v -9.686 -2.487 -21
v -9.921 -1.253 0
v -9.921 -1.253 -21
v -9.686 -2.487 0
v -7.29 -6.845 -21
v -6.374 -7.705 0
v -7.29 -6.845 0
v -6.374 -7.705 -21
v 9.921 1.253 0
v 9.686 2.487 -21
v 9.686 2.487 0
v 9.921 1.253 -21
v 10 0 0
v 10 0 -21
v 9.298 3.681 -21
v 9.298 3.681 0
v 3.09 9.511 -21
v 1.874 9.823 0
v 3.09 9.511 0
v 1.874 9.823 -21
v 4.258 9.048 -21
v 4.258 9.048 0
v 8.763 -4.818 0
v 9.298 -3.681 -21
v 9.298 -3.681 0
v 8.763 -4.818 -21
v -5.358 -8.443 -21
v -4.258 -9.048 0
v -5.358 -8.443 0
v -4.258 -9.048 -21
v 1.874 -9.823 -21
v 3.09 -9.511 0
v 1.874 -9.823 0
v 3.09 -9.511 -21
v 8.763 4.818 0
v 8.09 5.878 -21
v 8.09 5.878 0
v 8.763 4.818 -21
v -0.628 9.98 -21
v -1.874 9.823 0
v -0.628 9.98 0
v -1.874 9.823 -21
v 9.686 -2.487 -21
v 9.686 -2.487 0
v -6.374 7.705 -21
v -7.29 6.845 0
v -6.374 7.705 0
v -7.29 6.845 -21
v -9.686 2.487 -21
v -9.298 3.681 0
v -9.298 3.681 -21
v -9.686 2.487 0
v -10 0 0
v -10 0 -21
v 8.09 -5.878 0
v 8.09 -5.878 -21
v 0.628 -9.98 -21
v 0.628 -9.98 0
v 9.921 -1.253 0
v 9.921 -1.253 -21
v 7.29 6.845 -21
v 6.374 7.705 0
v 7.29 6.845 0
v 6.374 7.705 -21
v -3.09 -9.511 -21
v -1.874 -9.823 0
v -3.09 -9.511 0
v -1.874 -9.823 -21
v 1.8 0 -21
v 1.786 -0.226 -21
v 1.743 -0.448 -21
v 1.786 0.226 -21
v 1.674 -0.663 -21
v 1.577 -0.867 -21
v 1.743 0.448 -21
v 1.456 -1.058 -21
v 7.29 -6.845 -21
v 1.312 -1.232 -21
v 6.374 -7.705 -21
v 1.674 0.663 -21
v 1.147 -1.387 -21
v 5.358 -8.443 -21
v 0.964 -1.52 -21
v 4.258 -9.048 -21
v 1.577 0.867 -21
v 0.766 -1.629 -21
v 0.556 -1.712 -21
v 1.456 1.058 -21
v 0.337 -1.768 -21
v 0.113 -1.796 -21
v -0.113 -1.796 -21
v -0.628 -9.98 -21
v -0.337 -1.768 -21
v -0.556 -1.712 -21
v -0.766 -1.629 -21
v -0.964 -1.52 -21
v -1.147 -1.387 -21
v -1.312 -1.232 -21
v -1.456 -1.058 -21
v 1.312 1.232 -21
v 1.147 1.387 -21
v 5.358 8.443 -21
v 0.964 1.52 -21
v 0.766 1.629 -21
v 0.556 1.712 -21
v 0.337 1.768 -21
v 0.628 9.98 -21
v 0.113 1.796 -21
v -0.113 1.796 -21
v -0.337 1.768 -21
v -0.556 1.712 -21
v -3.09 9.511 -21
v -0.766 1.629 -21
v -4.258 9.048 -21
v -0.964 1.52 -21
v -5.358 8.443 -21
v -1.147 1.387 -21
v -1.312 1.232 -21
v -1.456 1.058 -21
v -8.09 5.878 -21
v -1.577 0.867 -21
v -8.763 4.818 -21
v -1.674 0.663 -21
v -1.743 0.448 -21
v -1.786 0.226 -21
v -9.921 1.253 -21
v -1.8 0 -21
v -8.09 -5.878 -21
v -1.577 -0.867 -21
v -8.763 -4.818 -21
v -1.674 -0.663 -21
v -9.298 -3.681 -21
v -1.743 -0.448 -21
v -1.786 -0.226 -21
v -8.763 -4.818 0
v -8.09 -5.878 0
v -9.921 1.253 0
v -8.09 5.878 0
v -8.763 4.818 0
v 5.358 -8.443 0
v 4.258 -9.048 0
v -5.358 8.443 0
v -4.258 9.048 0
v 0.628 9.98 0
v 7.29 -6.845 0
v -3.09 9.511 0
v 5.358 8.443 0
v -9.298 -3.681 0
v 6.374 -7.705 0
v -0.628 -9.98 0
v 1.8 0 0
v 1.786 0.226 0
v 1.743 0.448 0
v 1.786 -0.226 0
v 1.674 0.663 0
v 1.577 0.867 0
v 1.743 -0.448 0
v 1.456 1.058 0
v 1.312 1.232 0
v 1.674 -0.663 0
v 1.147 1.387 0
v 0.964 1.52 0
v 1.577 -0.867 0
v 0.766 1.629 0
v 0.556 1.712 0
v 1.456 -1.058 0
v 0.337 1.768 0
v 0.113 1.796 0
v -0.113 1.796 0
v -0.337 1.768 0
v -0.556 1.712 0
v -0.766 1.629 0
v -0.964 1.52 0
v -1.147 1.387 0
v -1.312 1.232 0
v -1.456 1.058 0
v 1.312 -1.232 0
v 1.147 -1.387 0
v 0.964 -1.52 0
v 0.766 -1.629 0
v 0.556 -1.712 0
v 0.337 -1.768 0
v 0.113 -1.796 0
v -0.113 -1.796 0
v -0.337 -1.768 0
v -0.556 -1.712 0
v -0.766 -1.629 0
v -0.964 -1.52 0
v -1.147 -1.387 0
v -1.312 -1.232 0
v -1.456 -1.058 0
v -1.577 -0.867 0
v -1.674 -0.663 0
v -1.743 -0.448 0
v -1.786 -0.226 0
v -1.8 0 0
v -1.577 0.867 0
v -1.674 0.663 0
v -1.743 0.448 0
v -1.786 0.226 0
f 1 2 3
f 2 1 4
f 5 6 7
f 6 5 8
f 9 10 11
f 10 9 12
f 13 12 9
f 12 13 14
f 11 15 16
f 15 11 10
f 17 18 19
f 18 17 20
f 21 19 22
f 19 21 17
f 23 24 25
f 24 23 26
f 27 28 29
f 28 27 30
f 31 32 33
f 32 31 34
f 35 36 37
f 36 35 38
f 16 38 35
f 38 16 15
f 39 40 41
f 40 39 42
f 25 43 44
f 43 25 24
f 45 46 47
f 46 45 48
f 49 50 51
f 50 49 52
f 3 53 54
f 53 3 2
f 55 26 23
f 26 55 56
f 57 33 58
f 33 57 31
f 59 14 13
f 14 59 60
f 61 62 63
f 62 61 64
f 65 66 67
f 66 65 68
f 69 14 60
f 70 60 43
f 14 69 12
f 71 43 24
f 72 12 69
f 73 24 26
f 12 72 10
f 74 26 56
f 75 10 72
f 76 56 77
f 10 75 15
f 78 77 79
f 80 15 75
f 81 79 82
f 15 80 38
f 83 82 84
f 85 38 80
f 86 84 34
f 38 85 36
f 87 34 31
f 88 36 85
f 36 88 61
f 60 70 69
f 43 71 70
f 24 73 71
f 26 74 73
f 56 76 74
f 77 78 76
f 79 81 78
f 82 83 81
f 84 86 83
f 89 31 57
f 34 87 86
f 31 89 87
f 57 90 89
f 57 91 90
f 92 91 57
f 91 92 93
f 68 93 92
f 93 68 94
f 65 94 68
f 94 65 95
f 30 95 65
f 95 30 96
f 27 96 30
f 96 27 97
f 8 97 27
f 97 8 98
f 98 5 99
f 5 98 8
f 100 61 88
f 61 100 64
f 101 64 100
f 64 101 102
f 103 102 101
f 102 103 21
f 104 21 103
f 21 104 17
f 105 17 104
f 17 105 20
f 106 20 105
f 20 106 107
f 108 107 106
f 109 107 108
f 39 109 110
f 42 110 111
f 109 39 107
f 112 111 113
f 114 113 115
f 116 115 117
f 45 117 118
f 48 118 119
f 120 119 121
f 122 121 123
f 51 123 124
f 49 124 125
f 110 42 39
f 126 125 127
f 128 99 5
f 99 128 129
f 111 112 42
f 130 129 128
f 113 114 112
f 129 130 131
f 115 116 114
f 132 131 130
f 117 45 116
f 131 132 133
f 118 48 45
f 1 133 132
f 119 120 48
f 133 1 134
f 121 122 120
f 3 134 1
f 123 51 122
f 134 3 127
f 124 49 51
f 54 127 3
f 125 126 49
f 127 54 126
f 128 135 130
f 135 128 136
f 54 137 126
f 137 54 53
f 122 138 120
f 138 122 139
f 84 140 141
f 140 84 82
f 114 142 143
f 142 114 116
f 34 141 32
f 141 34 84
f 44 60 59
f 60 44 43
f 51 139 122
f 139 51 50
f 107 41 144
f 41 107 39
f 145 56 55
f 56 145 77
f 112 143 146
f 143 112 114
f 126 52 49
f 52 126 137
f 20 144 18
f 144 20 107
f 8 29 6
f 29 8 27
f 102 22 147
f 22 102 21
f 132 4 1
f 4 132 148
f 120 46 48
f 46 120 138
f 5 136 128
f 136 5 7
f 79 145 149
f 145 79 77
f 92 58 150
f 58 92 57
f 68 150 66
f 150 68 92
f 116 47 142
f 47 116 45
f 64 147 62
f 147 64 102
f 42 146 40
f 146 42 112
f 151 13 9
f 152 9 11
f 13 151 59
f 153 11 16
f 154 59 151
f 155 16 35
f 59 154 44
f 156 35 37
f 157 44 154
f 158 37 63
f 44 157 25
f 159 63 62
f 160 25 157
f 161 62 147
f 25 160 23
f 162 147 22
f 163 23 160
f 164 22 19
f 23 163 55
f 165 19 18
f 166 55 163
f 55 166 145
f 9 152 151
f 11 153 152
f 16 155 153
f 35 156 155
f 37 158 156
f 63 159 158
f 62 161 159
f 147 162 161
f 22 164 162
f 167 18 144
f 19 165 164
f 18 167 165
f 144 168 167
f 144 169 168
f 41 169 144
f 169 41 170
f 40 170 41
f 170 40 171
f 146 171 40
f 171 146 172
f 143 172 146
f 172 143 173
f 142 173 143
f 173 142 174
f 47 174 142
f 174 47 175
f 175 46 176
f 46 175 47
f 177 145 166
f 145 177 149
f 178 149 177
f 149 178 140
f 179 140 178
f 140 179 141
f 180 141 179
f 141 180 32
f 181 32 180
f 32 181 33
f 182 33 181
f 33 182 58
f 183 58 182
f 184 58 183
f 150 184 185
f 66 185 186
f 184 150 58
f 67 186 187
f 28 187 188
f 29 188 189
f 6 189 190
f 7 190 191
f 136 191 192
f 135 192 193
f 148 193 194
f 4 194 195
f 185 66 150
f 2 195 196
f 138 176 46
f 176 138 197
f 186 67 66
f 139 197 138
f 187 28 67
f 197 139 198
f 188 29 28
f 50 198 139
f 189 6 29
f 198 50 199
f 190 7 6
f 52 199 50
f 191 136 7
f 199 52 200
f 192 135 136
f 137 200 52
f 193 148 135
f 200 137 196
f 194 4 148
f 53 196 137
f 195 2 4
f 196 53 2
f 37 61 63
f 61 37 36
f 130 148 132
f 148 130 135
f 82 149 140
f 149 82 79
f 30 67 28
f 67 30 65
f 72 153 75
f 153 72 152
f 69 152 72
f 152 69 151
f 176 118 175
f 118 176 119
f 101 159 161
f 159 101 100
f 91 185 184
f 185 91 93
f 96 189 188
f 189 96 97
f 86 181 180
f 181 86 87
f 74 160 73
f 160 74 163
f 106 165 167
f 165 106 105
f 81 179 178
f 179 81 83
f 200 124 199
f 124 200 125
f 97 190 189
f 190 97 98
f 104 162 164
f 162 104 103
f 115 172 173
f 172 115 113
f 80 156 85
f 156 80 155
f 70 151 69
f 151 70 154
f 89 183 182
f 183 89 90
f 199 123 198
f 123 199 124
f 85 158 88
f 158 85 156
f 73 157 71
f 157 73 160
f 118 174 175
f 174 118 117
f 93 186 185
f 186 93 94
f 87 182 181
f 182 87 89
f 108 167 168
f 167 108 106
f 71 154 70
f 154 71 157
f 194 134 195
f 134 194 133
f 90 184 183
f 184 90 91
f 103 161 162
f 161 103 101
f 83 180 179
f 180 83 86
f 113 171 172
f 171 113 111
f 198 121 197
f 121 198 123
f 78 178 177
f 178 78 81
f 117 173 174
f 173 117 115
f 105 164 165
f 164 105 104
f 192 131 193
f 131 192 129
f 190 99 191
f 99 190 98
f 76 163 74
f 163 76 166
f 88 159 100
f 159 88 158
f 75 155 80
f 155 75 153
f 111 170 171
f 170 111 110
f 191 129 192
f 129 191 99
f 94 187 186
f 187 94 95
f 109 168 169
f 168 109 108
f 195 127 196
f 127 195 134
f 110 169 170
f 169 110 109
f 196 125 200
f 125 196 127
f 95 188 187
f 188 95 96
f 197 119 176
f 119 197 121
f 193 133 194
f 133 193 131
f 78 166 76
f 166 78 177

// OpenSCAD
$fn = 50;


difference() {
	union() {
		translate(v = [0, 0, -21.0000000000]) {
			cylinder(h = 21, r = 10.0000000000);
		}
		cylinder(h = 0, r = 19.0000000000);
	}
	union() {
		#translate(v = [0, 0, -21]) {
			cylinder(h = 21, r = 1.8000000000);
		}
	}
}
